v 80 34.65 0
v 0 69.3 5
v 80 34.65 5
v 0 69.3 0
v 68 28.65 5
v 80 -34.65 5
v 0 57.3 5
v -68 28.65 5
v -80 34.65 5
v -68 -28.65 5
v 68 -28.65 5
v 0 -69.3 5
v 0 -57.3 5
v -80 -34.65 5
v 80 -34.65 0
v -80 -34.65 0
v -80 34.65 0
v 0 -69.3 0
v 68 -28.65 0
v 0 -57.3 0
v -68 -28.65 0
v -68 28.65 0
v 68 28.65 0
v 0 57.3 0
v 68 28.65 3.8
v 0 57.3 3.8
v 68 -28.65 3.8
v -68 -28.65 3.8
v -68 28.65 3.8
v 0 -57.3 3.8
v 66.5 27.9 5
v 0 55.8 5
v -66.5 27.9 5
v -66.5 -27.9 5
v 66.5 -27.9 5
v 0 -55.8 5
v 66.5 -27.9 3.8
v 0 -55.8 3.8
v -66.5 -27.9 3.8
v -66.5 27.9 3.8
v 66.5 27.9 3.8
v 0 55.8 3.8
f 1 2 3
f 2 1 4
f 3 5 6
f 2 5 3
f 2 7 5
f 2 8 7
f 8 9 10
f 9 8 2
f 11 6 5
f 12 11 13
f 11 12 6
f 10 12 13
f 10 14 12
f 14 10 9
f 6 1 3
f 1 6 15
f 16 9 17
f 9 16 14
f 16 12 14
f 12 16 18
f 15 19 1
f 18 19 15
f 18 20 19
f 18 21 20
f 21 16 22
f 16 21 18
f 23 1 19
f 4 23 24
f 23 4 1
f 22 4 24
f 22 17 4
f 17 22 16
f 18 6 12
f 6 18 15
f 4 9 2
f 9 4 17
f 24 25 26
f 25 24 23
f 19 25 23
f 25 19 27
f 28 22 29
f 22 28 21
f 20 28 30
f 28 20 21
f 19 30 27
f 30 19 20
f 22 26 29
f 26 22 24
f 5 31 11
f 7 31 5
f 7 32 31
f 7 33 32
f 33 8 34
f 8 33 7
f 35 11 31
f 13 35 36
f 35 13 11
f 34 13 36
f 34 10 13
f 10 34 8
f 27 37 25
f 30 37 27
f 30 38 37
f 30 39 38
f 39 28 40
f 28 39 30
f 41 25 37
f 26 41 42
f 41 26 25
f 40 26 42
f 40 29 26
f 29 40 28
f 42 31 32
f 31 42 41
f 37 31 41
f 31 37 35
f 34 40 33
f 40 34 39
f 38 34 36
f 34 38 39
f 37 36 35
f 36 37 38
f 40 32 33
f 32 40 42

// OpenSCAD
// HexaMemória frame generator.
// Example:
// openscad -o hexa_s.stl -D 'width=160' -D 'height=138.6' -D 'color_name="Preto"' scripts/openscad/hexa_frame.scad
//
// Print orientation: visible face down on the build plate, with the front face at Z=0.

width = 160;
height = 138.6;
border_thickness = 12;
depth_thickness = 5;
color_name = "Preto";

inner_lip = 1.5;
lip_depth = 1.2;

$fn = 48;

module hex_2d(w, h) {
  polygon(points = [
    [w / 2, 0],
    [w, h / 4],
    [w, h * 3 / 4],
    [w / 2, h],
    [0, h * 3 / 4],
    [0, h / 4],
  ]);
}

module hex_prism(w, h, z) {
  linear_extrude(height = z)
    hex_2d(w, h);
}

module centered_hex(w, h, z) {
  translate([-w / 2, -h / 2, 0])
    hex_prism(w, h, z);
}

module frame_shell() {
  inner_w = max(1, width - border_thickness * 2);
  inner_h = max(1, height - border_thickness * 2);

  difference() {
    centered_hex(width, height, depth_thickness);
    translate([0, 0, -0.1])
      centered_hex(inner_w, inner_h, depth_thickness + 0.2);
  }
}

module photo_lip() {
  opening_w = max(1, width - border_thickness * 2);
  opening_h = max(1, height - border_thickness * 2);
  clear_w = max(1, opening_w - inner_lip * 2);
  clear_h = max(1, opening_h - inner_lip * 2);

  translate([0, 0, depth_thickness - lip_depth])
    difference() {
      centered_hex(opening_w, opening_h, lip_depth);
      translate([0, 0, -0.1])
        centered_hex(clear_w, clear_h, lip_depth + 0.2);
    }
}

color(color_name)
  union() {
    frame_shell();
    photo_lip();
  }
